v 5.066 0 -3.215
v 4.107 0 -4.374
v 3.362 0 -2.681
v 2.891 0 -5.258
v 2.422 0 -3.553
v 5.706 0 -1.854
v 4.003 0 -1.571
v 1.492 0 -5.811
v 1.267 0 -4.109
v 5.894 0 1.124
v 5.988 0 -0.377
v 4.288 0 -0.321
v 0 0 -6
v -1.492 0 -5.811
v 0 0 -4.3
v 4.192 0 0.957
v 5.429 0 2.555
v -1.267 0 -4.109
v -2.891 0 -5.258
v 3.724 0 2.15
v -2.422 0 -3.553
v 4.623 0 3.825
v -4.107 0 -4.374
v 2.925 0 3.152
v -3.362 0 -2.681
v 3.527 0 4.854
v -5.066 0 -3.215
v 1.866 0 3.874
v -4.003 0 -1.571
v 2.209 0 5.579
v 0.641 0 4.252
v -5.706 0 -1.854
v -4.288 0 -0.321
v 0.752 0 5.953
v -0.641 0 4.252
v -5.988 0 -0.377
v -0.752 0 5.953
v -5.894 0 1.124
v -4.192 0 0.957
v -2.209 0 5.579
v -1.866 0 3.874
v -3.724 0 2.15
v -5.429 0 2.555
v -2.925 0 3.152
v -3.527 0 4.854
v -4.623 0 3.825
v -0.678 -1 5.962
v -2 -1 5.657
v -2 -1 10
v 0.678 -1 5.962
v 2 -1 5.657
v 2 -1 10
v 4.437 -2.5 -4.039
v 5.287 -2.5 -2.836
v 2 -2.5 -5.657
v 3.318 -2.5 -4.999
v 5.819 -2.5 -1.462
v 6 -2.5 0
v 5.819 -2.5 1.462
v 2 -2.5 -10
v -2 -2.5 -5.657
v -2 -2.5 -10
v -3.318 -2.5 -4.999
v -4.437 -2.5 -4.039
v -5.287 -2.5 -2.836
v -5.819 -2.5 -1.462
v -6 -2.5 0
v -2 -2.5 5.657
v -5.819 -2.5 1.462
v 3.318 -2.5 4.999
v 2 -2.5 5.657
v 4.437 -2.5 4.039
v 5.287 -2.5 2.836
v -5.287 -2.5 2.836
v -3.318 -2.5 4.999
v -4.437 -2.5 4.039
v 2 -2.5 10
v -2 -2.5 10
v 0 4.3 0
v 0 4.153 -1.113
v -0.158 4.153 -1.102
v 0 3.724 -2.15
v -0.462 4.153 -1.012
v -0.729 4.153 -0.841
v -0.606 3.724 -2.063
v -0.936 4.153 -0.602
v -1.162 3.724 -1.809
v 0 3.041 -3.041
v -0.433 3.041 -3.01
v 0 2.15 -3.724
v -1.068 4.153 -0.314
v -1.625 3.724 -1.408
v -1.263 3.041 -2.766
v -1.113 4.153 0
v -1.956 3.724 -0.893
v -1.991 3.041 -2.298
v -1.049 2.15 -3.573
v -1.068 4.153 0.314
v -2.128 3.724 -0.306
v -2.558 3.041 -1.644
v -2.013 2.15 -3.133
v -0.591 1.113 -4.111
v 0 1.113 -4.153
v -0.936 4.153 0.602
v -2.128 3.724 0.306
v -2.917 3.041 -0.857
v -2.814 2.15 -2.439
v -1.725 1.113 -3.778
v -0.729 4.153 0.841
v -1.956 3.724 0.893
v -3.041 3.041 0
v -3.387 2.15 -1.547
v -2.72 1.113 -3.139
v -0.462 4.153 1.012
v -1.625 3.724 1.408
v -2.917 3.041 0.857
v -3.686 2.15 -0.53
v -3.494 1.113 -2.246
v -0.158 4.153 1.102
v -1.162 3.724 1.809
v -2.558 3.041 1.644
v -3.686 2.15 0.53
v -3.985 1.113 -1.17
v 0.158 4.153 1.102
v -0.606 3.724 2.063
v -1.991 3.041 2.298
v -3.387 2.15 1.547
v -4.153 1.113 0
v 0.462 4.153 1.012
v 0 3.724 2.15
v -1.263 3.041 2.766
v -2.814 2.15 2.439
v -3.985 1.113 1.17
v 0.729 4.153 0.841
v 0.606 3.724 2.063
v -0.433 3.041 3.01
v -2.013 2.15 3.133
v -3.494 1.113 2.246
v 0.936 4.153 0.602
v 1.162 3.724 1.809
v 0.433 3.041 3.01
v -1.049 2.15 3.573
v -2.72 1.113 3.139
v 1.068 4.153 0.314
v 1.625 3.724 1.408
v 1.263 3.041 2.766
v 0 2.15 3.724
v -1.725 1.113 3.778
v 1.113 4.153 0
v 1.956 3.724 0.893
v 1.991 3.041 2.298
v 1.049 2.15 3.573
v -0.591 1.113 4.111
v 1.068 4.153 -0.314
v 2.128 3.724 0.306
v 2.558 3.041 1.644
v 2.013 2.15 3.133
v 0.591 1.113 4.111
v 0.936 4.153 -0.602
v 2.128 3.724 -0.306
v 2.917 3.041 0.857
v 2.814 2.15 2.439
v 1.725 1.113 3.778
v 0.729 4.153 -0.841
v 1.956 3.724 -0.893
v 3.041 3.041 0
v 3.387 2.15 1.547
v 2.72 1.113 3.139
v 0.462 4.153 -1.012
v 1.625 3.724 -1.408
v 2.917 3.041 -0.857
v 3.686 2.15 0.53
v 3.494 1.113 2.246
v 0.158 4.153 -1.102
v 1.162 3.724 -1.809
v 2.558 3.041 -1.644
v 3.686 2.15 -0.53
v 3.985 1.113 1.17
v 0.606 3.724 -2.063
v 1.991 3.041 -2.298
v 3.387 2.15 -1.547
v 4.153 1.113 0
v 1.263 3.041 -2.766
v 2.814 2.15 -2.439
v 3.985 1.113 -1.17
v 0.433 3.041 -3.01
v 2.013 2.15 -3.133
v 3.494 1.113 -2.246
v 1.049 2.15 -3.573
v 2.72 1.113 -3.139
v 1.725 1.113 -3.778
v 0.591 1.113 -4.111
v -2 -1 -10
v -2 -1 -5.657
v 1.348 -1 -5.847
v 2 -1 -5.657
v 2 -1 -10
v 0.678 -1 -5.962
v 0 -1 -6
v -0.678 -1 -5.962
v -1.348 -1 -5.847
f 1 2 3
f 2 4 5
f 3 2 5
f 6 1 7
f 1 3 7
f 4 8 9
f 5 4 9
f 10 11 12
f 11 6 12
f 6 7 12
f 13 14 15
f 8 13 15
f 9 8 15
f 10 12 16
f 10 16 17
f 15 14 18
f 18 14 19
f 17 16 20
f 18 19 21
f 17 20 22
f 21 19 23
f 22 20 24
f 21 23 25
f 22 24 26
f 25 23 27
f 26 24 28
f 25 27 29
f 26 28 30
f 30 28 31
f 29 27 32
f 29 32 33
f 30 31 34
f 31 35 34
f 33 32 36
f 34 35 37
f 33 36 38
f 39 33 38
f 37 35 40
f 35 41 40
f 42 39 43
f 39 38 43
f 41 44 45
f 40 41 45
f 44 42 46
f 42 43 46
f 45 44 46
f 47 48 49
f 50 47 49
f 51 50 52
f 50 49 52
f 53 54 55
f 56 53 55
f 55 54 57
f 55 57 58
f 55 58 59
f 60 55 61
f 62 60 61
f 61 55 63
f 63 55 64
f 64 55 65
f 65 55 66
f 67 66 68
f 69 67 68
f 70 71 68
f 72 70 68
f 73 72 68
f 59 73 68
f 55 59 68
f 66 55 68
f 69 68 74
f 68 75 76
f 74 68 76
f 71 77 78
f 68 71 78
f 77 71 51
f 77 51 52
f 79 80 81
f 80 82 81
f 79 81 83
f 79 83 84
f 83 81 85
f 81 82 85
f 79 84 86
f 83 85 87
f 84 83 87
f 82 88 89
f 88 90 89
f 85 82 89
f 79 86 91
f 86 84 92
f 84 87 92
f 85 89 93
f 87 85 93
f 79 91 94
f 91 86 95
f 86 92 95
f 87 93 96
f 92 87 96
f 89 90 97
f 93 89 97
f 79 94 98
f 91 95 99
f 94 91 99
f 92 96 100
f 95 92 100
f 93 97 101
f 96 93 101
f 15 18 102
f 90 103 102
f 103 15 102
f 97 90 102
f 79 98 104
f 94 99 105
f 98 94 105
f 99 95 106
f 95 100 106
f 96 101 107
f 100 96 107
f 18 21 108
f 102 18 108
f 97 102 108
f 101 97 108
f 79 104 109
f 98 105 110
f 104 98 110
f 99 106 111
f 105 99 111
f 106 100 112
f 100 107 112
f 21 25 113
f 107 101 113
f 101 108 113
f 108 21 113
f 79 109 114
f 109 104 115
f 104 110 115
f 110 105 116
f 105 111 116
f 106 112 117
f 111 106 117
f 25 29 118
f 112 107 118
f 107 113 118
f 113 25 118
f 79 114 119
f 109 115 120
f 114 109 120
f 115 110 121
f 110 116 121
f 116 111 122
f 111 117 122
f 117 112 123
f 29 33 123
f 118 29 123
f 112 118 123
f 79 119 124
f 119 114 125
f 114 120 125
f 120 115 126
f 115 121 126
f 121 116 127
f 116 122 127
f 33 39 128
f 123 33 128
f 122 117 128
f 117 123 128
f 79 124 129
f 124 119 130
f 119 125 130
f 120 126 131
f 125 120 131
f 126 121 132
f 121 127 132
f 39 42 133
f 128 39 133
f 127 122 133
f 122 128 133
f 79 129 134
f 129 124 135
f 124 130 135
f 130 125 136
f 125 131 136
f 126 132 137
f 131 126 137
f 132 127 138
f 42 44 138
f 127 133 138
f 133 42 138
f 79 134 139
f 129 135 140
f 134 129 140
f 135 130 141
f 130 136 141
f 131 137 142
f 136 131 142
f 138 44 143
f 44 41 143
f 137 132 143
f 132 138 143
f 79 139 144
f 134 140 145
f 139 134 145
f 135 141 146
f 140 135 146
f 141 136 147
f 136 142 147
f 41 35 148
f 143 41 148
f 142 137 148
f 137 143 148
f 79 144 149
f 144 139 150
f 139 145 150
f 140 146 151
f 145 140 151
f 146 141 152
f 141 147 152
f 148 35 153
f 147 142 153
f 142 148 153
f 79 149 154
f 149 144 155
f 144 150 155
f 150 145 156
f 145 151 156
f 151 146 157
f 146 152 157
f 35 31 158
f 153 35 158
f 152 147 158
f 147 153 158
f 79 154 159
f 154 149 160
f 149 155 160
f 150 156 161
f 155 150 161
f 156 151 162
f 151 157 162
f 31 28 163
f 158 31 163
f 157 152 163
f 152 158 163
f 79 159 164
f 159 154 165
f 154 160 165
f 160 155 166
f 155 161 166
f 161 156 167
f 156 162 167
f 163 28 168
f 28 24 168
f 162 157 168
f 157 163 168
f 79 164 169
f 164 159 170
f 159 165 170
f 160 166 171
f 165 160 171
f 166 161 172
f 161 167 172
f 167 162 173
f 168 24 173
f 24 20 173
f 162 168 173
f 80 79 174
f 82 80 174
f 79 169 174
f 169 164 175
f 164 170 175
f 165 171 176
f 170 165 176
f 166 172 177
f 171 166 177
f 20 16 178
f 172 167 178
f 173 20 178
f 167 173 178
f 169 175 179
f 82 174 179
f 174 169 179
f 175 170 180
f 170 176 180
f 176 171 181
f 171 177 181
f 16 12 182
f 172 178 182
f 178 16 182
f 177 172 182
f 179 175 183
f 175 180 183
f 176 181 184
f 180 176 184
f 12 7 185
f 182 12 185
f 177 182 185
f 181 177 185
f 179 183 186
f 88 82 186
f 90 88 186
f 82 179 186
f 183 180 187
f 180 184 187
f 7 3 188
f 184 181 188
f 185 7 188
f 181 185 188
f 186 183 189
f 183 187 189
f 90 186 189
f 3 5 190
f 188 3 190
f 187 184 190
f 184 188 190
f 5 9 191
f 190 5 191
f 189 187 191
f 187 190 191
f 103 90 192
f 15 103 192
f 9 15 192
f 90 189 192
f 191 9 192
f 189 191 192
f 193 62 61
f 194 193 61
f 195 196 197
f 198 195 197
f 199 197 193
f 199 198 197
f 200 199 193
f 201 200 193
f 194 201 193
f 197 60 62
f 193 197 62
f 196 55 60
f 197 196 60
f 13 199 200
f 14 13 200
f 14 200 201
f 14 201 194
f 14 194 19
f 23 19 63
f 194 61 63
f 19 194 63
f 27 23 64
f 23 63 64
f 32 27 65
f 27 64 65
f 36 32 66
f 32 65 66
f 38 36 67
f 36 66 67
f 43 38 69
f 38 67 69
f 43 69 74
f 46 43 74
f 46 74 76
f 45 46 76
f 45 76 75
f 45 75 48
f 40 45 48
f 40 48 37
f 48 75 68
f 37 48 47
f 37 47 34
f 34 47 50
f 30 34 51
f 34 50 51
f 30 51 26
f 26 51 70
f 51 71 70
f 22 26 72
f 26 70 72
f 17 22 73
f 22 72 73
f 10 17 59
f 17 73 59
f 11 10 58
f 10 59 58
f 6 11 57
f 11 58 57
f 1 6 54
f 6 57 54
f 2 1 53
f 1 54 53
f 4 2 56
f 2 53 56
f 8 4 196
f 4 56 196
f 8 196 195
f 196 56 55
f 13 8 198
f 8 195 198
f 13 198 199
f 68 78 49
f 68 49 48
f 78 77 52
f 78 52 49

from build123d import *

# Parameters (mm, degrees)
BOSS_EXTRUDE1_DEPTH = 1.5


with BuildPart() as part:
    # Sketch1 → Revolve1 (revolve)
    with BuildSketch(Plane(origin=(0, 0, 0), x_dir=(0, 0, -1), z_dir=(1, 0, 0))):
        with BuildLine():
            Line((4.3, 0), (6, 0))
            Line((6, 0), (6, -2.5))
            Line((6, -2.5), (0, -2.5))
            Line((0, -2.5), (0, 4.3))
            ThreePointArc((0, 4.3), (3.040559159, 3.040559159), (4.3, 0))
        make_face()
    revolve(axis=Axis((0, -2.5, 0), (0, 1, 0)))

    # Sketch2 → Boss-Extrude1 (add)
    with BuildSketch(Plane.XZ.offset(2.5)):
        with BuildLine():
            Line((0, 10), (-2, 10))
            Line((-2, 10), (-2, 5.656854249))
            ThreePointArc((-2, 5.656854249), (0, 6), (2, 5.656854249))
            Line((2, 5.656854249), (2, 10))
            Line((2, 10), (0, 10))
        make_face()
        with BuildLine():
            Line((0, -10), (-2, -10))
            Line((-2, -10), (-2, -5.656854249))
            ThreePointArc((-2, -5.656854249), (0, -6), (2, -5.656854249))
            Line((2, -5.656854249), (2, -10))
            Line((2, -10), (0, -10))
        make_face()
    extrude(amount=-BOSS_EXTRUDE1_DEPTH)


solid = part.part
